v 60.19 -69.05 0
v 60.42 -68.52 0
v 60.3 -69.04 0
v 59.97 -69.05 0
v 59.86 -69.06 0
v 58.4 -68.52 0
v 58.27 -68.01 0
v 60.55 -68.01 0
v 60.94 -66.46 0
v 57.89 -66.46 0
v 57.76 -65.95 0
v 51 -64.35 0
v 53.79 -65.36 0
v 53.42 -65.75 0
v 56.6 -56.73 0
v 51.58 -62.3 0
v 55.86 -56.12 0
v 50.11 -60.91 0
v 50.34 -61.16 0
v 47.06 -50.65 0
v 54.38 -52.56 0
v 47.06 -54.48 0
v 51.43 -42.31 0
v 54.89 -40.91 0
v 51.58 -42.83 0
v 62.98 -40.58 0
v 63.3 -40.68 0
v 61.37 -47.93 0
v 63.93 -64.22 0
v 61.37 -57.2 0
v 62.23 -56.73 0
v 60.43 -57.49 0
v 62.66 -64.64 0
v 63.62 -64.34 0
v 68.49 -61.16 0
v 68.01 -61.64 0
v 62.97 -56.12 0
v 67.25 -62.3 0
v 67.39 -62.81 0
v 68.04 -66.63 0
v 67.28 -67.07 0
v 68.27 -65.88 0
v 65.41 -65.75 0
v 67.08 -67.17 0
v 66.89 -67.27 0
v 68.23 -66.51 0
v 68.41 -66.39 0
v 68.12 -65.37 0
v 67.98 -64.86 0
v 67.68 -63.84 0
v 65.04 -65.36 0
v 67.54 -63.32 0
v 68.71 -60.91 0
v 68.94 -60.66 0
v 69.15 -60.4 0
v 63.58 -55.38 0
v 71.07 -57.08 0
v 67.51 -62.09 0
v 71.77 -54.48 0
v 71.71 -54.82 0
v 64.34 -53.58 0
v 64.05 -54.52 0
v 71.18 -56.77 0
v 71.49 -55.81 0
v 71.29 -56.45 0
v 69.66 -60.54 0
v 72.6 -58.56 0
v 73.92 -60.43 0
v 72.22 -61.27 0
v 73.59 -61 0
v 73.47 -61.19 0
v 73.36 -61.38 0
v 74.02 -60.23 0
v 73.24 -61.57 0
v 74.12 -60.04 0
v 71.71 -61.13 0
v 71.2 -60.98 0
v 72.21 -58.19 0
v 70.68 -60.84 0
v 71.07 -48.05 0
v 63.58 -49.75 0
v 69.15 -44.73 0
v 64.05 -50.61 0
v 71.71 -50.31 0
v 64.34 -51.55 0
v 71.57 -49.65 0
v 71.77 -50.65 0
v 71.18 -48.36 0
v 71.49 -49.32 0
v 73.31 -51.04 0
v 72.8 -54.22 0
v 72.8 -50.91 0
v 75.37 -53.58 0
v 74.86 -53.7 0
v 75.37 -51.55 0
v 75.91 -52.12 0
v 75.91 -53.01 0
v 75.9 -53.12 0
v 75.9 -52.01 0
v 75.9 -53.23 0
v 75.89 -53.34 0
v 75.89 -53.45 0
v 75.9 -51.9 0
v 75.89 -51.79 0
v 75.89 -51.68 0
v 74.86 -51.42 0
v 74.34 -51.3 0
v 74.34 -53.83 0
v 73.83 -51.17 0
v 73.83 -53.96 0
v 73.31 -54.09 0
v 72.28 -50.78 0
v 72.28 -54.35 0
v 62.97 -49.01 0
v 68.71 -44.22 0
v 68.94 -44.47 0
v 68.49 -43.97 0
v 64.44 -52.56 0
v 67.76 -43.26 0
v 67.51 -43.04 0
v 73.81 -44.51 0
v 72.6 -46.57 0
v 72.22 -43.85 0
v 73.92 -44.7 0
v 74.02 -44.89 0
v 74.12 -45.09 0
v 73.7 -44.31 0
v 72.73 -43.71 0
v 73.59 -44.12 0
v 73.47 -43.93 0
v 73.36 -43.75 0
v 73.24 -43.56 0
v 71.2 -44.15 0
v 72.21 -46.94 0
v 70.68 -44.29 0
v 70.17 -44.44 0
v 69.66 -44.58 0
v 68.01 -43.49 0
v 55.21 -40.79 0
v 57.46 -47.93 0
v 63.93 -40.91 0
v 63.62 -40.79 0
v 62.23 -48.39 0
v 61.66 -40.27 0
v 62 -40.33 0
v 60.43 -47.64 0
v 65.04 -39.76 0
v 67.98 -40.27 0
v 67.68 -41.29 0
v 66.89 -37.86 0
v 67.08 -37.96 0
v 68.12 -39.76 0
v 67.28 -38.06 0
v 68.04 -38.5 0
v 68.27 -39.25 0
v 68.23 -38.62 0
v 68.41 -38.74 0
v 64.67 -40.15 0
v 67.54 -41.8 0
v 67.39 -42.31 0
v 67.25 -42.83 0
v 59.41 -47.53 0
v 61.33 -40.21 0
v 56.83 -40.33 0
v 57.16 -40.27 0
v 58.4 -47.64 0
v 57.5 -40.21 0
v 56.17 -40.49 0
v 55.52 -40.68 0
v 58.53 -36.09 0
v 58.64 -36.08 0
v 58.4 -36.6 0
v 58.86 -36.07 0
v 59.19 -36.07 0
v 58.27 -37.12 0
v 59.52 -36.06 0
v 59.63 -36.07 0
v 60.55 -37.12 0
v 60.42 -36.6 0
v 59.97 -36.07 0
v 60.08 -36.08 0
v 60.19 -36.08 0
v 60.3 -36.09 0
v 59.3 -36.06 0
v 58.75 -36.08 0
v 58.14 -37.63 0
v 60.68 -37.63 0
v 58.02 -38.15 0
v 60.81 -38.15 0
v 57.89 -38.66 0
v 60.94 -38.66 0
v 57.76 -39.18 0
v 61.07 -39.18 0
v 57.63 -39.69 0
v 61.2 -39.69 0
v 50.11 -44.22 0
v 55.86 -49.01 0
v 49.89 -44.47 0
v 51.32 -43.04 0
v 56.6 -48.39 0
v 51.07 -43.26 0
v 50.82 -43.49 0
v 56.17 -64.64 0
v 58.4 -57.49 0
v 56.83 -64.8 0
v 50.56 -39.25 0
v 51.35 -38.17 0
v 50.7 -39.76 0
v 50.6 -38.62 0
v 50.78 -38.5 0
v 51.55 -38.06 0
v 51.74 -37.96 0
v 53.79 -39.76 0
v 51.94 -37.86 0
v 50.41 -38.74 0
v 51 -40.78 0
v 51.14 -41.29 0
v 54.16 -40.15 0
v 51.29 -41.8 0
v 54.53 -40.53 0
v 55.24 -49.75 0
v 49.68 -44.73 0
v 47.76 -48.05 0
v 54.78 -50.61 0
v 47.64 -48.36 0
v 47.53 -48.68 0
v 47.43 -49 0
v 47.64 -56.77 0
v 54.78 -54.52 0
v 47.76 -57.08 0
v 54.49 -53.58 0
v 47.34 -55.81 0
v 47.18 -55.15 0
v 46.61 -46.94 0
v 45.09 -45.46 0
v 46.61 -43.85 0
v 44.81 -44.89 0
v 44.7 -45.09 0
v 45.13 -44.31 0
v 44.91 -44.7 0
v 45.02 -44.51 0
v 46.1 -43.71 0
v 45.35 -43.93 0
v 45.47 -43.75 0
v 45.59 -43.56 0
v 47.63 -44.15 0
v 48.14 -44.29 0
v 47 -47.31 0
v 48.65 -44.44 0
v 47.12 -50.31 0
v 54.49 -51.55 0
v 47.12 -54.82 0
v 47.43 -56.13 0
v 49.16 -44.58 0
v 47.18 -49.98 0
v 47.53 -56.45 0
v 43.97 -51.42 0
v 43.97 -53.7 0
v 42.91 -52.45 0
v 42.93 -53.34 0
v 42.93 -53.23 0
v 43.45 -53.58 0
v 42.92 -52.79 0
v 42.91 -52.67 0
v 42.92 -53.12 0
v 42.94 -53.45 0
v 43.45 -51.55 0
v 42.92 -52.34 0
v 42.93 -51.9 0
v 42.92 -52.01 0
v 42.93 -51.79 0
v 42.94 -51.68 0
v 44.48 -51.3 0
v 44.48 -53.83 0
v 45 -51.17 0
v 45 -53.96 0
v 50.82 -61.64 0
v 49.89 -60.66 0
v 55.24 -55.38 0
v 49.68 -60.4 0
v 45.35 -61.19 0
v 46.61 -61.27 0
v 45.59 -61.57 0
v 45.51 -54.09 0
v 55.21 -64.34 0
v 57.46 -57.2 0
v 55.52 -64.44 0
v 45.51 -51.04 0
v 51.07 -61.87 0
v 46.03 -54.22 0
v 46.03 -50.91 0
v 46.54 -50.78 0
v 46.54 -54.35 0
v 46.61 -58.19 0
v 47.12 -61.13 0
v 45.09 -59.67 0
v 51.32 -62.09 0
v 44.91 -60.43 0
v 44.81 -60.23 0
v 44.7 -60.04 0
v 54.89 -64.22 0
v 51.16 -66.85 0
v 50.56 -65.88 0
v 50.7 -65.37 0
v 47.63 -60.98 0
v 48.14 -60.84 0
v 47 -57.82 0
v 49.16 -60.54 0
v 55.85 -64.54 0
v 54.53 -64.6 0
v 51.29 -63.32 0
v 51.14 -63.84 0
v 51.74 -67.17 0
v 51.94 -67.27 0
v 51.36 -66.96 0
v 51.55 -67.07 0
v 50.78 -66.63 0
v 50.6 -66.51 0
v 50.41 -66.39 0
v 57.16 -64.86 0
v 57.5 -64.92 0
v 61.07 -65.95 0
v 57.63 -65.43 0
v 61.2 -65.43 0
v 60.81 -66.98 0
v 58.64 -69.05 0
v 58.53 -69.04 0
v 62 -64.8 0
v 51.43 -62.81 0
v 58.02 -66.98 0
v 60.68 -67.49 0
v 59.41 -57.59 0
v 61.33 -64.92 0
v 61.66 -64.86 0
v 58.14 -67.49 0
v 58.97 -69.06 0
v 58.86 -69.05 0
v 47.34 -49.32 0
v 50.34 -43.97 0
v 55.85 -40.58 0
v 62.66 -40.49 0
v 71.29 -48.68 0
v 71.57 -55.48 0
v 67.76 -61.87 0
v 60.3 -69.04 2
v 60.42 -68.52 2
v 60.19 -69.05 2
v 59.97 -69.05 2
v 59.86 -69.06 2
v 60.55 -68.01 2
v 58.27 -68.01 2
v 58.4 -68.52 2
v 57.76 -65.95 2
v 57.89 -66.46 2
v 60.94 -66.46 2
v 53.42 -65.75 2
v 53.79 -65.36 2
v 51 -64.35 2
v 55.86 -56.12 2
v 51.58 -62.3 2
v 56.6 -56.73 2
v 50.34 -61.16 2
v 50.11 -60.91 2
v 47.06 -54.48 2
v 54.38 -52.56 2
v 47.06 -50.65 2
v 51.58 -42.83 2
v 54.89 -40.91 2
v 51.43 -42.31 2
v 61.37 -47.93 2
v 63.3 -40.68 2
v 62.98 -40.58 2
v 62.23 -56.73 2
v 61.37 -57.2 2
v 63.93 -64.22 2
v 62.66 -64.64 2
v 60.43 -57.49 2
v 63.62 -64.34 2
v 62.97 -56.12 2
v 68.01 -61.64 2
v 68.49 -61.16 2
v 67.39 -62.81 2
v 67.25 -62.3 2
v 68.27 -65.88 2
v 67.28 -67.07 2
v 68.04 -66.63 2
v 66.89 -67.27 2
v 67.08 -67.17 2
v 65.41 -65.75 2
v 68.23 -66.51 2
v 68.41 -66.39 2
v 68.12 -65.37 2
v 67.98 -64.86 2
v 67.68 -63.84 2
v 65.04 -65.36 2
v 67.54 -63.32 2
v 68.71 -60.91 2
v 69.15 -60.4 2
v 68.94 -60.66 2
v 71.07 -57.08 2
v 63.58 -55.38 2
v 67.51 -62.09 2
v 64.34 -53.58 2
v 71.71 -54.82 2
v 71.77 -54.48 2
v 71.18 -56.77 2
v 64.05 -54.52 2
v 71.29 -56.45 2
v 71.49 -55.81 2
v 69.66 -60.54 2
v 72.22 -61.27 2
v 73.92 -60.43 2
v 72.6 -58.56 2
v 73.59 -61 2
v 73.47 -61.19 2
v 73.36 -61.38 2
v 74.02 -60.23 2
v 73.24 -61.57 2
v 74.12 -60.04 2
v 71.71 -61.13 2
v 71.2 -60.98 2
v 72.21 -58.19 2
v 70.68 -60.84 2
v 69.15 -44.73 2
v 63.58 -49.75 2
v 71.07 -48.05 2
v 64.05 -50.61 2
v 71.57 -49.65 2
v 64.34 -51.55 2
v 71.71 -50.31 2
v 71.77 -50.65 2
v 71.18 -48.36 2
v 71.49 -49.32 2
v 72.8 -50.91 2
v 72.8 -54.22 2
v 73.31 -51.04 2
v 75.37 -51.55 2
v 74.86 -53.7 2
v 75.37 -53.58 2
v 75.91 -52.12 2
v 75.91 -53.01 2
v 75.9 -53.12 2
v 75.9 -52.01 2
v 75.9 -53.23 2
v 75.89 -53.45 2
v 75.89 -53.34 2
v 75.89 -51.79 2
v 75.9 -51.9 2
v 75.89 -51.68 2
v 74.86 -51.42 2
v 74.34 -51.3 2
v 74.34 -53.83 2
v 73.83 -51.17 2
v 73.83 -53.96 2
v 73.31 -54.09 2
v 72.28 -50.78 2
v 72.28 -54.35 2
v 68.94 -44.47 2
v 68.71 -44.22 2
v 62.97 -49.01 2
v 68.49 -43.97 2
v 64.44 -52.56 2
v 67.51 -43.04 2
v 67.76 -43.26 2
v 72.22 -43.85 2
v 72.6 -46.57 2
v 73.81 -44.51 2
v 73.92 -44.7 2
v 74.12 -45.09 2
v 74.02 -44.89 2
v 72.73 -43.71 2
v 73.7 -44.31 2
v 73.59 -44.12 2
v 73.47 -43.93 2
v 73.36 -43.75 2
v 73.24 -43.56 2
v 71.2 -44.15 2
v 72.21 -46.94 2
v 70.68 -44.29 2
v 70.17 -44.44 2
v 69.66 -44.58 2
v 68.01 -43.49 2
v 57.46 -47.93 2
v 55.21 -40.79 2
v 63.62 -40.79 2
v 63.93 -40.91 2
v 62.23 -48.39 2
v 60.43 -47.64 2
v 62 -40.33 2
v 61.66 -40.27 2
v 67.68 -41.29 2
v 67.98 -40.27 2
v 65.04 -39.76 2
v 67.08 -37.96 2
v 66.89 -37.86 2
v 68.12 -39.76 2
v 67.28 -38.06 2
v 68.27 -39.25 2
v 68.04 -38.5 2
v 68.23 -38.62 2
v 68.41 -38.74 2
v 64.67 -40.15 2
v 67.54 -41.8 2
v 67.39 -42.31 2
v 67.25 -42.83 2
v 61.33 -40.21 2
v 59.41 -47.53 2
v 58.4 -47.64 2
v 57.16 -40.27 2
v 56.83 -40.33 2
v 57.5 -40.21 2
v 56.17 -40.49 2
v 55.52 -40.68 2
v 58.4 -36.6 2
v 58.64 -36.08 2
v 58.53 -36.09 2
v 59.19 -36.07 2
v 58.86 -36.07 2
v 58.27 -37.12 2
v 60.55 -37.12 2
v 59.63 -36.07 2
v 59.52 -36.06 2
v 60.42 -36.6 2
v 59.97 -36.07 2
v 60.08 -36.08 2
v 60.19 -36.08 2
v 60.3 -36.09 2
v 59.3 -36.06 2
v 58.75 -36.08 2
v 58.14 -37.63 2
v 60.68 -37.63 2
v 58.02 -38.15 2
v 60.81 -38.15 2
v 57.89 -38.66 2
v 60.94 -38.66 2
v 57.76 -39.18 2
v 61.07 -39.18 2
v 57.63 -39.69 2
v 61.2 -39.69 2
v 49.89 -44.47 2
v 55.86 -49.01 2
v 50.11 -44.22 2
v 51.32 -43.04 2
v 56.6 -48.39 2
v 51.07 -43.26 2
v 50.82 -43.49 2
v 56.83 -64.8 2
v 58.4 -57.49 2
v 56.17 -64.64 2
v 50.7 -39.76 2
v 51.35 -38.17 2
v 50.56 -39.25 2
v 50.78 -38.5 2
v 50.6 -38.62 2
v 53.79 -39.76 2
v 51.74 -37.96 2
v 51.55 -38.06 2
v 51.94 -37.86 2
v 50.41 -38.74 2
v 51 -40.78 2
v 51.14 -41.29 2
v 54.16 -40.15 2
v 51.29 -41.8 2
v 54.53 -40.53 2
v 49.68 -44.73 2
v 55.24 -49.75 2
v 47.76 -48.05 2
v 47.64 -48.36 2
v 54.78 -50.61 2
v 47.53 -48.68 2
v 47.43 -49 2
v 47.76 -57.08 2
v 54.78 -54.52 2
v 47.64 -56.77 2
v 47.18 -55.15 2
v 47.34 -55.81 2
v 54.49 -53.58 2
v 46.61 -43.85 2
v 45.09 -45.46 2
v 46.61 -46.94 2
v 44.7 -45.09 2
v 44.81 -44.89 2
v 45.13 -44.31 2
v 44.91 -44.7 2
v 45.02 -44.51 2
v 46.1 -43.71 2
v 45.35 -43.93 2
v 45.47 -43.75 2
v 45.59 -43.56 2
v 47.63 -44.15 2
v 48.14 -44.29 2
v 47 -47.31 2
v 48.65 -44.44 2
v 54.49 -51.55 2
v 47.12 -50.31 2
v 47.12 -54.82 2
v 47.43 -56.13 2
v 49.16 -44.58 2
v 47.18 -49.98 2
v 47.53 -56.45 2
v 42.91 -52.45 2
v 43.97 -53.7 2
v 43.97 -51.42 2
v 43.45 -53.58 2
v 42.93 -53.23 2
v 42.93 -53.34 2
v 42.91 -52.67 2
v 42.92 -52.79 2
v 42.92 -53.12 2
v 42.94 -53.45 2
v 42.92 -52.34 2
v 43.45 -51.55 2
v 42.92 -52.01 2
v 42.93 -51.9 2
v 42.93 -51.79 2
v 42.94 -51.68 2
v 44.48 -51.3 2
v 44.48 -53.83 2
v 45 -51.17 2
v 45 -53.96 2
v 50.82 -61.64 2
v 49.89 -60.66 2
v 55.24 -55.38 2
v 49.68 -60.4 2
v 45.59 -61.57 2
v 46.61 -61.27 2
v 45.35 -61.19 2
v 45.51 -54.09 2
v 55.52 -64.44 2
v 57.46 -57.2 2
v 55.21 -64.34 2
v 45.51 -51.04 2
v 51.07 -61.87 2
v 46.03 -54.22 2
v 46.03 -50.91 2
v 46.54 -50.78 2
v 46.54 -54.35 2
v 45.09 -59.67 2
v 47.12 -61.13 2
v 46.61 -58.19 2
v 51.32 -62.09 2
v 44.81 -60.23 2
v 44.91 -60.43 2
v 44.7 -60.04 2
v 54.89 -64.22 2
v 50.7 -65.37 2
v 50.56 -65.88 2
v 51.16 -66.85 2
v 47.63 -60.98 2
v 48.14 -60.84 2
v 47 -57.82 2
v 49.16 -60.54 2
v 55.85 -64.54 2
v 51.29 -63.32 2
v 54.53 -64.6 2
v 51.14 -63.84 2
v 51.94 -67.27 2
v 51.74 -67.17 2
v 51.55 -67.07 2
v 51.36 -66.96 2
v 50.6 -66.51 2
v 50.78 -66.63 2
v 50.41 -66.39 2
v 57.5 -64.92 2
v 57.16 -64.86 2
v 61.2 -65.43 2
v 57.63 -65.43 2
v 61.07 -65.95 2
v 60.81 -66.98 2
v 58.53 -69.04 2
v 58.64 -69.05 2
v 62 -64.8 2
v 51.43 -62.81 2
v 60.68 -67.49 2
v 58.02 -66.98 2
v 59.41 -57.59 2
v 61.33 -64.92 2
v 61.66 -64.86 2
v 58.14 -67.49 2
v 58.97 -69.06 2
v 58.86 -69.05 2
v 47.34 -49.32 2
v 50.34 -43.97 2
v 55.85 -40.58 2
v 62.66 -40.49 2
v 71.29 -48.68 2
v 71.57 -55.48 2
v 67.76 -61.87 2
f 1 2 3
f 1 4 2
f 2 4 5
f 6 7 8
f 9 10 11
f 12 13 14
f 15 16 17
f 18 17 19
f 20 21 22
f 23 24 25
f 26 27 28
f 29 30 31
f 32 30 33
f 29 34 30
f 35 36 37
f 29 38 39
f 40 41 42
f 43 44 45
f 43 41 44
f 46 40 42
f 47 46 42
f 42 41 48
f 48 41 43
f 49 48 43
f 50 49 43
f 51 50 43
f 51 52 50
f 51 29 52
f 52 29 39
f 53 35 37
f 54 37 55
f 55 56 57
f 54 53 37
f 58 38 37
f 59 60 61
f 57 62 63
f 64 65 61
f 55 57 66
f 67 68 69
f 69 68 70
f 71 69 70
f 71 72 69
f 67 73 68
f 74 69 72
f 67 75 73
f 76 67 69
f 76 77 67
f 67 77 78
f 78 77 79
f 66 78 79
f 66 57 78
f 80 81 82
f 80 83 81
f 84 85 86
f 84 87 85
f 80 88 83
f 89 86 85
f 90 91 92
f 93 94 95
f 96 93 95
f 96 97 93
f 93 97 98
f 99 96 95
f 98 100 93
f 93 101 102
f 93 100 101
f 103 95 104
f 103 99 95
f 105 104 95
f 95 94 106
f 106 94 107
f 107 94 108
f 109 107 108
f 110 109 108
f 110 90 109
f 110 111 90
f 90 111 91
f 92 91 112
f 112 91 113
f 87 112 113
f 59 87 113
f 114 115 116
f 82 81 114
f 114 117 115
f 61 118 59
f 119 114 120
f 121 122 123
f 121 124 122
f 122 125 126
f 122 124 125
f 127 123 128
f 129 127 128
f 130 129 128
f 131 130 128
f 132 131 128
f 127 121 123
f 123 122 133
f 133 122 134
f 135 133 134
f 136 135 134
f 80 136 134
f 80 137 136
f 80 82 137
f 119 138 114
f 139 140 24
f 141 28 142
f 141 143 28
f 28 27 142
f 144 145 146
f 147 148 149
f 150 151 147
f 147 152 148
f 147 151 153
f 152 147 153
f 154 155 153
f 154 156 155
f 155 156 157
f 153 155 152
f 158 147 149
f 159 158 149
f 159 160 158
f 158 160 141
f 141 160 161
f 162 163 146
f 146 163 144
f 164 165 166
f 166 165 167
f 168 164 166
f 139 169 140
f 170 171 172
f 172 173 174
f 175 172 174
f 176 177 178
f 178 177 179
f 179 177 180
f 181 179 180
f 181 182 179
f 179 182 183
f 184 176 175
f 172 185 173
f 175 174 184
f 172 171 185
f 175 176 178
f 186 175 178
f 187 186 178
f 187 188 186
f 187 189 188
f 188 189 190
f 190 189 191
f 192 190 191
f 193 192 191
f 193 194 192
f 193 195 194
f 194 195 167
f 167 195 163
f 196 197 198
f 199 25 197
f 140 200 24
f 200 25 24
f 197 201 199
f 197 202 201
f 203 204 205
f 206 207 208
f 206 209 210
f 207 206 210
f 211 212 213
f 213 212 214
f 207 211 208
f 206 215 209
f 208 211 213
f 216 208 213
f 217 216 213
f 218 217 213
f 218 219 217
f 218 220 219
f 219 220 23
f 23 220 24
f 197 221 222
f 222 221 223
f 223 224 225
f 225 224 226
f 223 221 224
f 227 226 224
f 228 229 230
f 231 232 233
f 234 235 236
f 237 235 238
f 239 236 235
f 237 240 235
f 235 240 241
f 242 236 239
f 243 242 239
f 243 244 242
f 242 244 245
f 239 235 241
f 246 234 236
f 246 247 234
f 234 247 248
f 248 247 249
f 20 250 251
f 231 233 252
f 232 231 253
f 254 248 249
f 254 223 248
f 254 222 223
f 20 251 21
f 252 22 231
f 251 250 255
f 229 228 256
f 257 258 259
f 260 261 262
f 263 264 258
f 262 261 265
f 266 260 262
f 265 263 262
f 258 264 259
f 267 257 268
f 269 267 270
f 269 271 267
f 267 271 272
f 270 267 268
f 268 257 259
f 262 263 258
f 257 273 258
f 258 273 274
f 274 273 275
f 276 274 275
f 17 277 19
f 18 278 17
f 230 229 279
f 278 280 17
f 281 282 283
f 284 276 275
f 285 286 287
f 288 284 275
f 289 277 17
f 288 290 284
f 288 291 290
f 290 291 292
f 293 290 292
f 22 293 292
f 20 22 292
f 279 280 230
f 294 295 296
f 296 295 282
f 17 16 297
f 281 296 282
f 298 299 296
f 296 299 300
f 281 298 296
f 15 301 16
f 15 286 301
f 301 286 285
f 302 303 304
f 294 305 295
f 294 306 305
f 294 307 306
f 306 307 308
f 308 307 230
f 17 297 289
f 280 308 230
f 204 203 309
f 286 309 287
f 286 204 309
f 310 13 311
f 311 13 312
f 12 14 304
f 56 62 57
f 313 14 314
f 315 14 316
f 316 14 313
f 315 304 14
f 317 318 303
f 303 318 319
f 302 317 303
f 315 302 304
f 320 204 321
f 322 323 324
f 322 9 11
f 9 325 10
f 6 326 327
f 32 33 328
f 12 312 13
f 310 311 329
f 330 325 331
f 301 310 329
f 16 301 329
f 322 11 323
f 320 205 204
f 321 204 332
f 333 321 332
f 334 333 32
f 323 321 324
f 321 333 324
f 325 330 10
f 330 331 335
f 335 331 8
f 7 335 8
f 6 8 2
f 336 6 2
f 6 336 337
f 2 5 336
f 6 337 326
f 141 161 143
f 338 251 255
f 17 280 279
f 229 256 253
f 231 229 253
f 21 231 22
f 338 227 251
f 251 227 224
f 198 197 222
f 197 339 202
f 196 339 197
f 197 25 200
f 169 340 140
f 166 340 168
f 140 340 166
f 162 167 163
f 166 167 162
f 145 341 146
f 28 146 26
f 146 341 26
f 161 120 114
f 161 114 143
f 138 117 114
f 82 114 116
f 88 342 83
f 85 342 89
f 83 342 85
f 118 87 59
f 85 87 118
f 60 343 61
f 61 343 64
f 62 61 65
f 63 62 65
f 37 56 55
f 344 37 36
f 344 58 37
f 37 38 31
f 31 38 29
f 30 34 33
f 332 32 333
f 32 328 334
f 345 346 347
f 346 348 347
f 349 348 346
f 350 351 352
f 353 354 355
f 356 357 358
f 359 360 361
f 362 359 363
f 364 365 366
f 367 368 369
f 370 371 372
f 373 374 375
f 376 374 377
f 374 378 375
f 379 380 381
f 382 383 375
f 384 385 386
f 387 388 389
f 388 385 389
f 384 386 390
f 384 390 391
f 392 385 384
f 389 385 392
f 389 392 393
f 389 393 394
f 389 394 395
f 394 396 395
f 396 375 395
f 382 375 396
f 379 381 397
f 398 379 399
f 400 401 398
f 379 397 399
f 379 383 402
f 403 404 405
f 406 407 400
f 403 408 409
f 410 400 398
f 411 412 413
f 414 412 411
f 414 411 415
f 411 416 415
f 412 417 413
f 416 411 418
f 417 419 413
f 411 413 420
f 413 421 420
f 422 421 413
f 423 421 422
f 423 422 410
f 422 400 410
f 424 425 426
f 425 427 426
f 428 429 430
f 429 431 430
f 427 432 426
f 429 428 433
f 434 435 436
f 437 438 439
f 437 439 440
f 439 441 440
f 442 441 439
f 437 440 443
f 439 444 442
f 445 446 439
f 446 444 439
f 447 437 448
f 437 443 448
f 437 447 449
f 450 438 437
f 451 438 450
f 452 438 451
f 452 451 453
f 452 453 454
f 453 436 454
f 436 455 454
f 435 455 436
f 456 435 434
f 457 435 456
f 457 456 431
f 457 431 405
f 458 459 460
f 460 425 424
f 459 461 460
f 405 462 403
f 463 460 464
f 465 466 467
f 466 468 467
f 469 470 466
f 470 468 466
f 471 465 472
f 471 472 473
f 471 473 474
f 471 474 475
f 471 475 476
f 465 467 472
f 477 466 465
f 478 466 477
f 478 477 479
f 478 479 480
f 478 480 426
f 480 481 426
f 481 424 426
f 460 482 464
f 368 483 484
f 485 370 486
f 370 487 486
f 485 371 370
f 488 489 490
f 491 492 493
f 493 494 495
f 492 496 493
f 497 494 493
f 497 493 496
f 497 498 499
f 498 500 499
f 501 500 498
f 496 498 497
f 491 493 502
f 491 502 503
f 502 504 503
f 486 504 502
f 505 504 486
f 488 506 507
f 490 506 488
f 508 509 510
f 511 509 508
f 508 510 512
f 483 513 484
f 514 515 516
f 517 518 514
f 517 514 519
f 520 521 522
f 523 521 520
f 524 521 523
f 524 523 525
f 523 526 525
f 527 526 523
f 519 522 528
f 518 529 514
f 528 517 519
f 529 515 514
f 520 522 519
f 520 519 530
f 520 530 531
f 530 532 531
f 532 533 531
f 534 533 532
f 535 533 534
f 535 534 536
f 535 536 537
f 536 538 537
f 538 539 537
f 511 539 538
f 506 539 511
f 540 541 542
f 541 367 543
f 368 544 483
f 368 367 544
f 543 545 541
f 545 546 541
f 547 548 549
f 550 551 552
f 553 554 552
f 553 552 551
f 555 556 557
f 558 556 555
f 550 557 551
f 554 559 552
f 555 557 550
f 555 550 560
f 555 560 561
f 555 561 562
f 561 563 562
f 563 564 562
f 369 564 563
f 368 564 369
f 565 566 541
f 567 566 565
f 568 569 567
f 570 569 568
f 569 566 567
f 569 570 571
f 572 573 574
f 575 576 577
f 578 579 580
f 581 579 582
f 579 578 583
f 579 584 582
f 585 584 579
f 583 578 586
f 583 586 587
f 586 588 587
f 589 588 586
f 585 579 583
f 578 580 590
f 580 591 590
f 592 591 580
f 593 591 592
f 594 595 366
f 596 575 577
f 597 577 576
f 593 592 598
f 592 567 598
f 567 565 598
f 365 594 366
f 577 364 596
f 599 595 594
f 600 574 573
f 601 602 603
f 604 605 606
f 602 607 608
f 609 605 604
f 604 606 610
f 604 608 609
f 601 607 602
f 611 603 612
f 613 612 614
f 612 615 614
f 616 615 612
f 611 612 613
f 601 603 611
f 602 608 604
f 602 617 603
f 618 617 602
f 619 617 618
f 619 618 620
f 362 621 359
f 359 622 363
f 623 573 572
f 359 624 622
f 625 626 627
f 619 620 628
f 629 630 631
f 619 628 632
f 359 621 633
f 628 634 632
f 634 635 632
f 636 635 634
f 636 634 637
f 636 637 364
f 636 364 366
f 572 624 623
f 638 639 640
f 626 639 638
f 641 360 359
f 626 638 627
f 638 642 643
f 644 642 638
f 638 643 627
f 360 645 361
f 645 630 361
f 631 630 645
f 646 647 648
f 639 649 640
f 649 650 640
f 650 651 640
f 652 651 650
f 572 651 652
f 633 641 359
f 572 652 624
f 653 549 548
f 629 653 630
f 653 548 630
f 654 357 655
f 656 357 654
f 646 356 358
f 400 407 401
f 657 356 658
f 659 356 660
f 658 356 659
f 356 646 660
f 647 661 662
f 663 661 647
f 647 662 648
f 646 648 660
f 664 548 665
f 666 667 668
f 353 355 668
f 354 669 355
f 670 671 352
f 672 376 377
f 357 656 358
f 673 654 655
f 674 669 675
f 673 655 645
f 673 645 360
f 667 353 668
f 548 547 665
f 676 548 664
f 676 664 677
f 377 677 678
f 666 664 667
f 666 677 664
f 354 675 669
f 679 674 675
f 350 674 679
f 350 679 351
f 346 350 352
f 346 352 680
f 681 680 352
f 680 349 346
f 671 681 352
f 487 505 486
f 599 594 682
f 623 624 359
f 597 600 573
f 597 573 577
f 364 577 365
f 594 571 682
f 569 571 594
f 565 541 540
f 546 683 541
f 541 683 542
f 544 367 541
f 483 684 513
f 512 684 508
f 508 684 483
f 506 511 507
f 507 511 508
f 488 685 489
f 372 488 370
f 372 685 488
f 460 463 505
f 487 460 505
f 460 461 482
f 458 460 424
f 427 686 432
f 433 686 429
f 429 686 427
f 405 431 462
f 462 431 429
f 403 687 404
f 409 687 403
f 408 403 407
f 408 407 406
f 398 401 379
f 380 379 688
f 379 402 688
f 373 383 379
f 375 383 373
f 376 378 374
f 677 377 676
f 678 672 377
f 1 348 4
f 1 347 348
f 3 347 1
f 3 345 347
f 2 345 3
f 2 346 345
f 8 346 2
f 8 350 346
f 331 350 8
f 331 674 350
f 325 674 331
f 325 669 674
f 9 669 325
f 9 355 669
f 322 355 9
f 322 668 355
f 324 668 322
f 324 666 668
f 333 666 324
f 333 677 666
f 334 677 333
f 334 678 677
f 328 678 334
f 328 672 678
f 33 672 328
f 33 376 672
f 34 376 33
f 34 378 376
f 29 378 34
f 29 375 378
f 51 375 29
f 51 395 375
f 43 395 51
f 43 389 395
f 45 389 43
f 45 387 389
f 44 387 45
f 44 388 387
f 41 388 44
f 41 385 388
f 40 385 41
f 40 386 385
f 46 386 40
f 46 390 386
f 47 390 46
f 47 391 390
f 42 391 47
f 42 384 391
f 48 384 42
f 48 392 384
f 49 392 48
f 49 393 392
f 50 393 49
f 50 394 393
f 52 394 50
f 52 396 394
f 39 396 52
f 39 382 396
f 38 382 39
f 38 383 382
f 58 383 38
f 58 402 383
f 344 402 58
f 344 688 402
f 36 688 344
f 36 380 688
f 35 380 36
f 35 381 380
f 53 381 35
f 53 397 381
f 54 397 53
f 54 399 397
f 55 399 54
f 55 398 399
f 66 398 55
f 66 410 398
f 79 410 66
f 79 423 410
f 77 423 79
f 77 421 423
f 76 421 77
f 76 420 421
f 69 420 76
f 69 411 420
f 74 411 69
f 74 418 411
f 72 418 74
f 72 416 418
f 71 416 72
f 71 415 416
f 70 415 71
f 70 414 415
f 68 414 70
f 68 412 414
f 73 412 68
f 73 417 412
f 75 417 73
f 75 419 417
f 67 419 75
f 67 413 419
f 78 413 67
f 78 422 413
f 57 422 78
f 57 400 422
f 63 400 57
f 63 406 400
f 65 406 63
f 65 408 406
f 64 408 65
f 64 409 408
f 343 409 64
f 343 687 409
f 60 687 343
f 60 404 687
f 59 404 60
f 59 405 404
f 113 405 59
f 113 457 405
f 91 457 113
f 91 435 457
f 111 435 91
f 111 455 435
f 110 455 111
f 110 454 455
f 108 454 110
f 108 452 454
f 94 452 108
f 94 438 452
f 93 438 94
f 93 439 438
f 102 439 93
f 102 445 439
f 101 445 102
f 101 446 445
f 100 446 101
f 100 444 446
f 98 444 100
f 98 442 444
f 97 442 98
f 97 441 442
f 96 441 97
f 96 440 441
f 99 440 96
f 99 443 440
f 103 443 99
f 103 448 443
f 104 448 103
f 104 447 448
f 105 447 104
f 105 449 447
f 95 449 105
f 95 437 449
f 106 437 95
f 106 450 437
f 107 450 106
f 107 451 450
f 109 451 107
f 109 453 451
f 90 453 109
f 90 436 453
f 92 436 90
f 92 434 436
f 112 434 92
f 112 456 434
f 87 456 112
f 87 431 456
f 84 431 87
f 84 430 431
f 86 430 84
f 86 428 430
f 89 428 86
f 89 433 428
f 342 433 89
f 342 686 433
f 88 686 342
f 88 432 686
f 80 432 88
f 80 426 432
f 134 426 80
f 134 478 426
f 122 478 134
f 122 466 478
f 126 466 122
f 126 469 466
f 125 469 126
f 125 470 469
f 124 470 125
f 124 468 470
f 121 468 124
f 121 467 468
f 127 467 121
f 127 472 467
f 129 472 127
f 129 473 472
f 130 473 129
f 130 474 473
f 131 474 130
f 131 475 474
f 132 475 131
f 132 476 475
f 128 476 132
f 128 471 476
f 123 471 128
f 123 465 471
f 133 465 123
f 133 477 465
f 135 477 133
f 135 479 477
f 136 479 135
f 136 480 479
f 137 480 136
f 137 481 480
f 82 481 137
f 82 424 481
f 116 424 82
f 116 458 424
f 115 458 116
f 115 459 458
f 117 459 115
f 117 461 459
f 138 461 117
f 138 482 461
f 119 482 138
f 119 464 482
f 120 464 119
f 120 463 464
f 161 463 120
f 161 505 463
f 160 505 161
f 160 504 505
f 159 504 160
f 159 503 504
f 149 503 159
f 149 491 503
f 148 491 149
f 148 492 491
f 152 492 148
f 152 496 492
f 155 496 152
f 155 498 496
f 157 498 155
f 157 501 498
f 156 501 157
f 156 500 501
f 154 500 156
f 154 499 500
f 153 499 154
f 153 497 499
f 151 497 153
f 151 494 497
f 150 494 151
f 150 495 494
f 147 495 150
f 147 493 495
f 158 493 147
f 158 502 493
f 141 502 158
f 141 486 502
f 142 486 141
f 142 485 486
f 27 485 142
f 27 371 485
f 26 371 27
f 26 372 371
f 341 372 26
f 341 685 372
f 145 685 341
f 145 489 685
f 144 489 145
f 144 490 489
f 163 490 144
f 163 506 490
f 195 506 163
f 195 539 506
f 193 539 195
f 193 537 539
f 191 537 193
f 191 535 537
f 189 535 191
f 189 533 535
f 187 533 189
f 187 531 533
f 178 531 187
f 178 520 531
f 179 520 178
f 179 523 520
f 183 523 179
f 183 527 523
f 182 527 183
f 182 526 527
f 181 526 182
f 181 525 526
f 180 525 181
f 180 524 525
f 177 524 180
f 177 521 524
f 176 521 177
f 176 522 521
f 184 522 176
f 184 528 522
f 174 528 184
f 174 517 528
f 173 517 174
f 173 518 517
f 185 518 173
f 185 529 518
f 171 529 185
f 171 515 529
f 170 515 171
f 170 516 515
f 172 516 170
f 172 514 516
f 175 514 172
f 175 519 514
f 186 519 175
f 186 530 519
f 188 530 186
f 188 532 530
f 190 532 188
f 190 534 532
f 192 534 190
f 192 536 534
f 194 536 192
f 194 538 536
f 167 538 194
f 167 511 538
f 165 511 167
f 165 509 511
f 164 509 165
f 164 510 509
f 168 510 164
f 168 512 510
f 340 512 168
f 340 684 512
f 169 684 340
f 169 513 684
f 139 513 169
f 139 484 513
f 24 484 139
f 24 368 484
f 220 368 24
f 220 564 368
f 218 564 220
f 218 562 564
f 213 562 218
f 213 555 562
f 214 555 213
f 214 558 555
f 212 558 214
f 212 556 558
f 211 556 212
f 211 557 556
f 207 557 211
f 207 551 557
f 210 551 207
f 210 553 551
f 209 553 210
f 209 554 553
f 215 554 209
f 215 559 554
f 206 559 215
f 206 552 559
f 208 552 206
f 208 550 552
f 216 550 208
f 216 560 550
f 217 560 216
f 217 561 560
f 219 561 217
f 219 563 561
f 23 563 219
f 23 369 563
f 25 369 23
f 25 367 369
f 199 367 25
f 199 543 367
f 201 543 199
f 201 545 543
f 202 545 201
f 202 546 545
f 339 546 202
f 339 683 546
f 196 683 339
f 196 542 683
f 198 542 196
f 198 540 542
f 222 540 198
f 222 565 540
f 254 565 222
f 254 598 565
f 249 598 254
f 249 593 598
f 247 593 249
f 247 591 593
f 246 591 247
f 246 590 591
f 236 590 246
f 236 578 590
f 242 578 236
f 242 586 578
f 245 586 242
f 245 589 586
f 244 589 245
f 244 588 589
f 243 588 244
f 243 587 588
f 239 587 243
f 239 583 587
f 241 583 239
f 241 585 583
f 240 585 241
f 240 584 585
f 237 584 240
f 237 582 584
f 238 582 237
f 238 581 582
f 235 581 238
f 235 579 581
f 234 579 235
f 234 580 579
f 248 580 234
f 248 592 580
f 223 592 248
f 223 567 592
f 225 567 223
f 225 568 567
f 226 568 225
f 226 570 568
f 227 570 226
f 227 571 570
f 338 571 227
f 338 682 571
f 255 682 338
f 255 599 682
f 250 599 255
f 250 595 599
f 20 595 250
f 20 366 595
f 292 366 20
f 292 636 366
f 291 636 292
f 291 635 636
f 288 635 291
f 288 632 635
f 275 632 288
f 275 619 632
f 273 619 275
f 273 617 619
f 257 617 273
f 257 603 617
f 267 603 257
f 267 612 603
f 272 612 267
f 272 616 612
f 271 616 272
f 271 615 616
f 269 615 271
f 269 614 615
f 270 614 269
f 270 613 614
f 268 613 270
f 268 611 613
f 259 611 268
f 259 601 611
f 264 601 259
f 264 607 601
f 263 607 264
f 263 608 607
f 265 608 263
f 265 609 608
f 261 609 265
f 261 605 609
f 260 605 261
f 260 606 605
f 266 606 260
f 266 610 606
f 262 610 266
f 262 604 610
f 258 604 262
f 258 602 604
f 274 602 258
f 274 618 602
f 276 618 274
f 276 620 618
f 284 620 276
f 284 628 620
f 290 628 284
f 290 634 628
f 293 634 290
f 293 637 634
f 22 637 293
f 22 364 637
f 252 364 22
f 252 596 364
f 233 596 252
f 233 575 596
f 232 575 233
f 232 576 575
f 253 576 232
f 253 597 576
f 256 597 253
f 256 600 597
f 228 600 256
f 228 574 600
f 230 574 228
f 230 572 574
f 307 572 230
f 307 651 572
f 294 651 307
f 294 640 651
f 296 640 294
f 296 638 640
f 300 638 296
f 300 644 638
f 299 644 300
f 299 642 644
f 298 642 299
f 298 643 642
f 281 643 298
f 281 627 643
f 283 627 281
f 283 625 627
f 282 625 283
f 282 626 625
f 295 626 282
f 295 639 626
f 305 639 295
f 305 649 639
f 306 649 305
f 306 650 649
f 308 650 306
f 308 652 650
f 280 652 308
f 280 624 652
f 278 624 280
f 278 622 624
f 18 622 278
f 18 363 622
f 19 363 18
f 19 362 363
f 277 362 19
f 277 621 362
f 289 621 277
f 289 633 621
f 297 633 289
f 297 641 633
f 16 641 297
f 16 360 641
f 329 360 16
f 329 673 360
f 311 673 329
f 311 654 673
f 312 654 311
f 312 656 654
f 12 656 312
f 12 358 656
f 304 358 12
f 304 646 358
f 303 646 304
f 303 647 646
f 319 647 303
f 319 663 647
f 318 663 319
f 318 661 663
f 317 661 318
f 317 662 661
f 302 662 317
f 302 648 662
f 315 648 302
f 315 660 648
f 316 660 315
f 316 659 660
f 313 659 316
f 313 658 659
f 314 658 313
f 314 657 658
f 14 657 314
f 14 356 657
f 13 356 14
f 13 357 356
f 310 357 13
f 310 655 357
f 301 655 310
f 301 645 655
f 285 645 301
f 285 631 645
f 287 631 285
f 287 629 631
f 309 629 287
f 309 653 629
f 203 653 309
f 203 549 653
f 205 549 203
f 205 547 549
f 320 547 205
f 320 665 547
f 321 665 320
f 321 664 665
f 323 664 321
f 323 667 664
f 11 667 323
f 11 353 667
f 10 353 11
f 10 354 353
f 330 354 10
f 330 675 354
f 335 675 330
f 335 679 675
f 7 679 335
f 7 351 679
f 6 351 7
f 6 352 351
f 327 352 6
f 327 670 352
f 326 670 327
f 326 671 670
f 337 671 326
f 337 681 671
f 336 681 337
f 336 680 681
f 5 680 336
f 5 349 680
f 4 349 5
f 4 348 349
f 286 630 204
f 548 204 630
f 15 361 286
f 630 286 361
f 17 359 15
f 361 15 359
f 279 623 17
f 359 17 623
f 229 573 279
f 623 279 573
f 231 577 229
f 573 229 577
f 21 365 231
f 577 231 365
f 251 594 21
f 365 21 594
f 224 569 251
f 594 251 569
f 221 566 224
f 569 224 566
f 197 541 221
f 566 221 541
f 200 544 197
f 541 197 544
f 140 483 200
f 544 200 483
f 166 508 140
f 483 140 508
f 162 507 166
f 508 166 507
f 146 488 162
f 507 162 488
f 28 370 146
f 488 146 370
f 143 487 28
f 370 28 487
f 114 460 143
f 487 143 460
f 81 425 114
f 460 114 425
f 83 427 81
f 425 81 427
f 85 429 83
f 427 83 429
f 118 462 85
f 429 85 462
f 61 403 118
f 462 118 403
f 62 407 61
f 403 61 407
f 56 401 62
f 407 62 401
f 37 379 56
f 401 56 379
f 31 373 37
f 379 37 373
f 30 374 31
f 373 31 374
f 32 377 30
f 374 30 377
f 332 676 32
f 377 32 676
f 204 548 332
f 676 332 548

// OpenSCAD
linear_extrude(height = 2, center = false) {

polygon(points=[[59.41,-57.59],[58.4,-57.49],[57.46,-57.2],[56.6,-56.73],[55.86,-56.12],[55.24,-55.38],[54.78,-54.52],[54.49,-53.58],[54.38,-52.56],[54.49,-51.55],[54.78,-50.61],[55.24,-49.75],[55.86,-49.01],[56.6,-48.39],[57.46,-47.93],[58.4,-47.64],[59.41,-47.53],[60.43,-47.64],[61.37,-47.93],[62.23,-48.39],[62.97,-49.01],[63.58,-49.75],[64.05,-50.61],[64.34,-51.55],[64.44,-52.56],[64.34,-53.58],[64.05,-54.52],[63.58,-55.38],[62.97,-56.12],[62.23,-56.73],[61.37,-57.2],[60.43,-57.49],[71.07,-48.05],[71.45,-47.68],[71.83,-47.31],[72.21,-46.94],[72.6,-46.57],[72.98,-46.2],[73.36,-45.83],[73.74,-45.46],[74.12,-45.09],[74.02,-44.89],[73.92,-44.7],[73.81,-44.51],[73.7,-44.31],[73.59,-44.12],[73.47,-43.93],[73.36,-43.75],[73.24,-43.56],[72.73,-43.71],[72.22,-43.85],[71.71,-44],[71.2,-44.15],[70.68,-44.29],[70.17,-44.44],[69.66,-44.58],[69.15,-44.73],[68.94,-44.47],[68.71,-44.22],[68.49,-43.97],[68.25,-43.73],[68.01,-43.49],[67.76,-43.26],[67.51,-43.04],[67.25,-42.83],[67.39,-42.31],[67.54,-41.8],[67.68,-41.29],[67.83,-40.78],[67.98,-40.27],[68.12,-39.76],[68.27,-39.25],[68.41,-38.74],[68.23,-38.62],[68.04,-38.5],[67.85,-38.39],[67.66,-38.28],[67.47,-38.17],[67.28,-38.06],[67.08,-37.96],[66.89,-37.86],[66.52,-38.24],[66.15,-38.62],[65.78,-39],[65.41,-39.38],[65.04,-39.76],[64.67,-40.15],[64.3,-40.53],[63.93,-40.91],[63.62,-40.79],[63.3,-40.68],[62.98,-40.58],[62.66,-40.49],[62.33,-40.41],[62,-40.33],[61.66,-40.27],[61.33,-40.21],[61.2,-39.69],[61.07,-39.18],[60.94,-38.66],[60.81,-38.15],[60.68,-37.63],[60.55,-37.12],[60.42,-36.6],[60.3,-36.09],[60.19,-36.08],[60.08,-36.08],[59.97,-36.07],[59.86,-36.07],[59.75,-36.07],[59.63,-36.07],[59.52,-36.06],[59.41,-36.06],[59.3,-36.06],[59.19,-36.07],[59.08,-36.07],[58.97,-36.07],[58.86,-36.07],[58.75,-36.08],[58.64,-36.08],[58.53,-36.09],[58.4,-36.6],[58.27,-37.12],[58.14,-37.63],[58.02,-38.15],[57.89,-38.66],[57.76,-39.18],[57.63,-39.69],[57.5,-40.21],[57.16,-40.27],[56.83,-40.33],[56.5,-40.41],[56.17,-40.49],[55.85,-40.58],[55.52,-40.68],[55.21,-40.79],[54.89,-40.91],[54.53,-40.53],[54.16,-40.15],[53.79,-39.76],[53.42,-39.38],[53.05,-39],[52.68,-38.62],[52.31,-38.24],[51.94,-37.86],[51.74,-37.96],[51.55,-38.06],[51.35,-38.17],[51.16,-38.28],[50.97,-38.39],[50.78,-38.5],[50.6,-38.62],[50.41,-38.74],[50.56,-39.25],[50.7,-39.76],[50.85,-40.27],[51,-40.78],[51.14,-41.29],[51.29,-41.8],[51.43,-42.31],[51.58,-42.83],[51.32,-43.04],[51.07,-43.26],[50.82,-43.49],[50.58,-43.73],[50.34,-43.97],[50.11,-44.22],[49.89,-44.47],[49.68,-44.73],[49.16,-44.58],[48.65,-44.44],[48.14,-44.29],[47.63,-44.15],[47.12,-44],[46.61,-43.85],[46.1,-43.71],[45.59,-43.56],[45.47,-43.75],[45.35,-43.93],[45.24,-44.12],[45.13,-44.31],[45.02,-44.51],[44.91,-44.7],[44.81,-44.89],[44.7,-45.09],[45.09,-45.46],[45.47,-45.83],[45.85,-46.2],[46.23,-46.57],[46.61,-46.94],[47,-47.31],[47.38,-47.68],[47.76,-48.05],[47.64,-48.36],[47.53,-48.68],[47.43,-49],[47.34,-49.32],[47.26,-49.65],[47.18,-49.98],[47.12,-50.31],[47.06,-50.65],[46.54,-50.78],[46.03,-50.91],[45.51,-51.04],[45,-51.17],[44.48,-51.3],[43.97,-51.42],[43.45,-51.55],[42.94,-51.68],[42.93,-51.79],[42.93,-51.9],[42.92,-52.01],[42.92,-52.12],[42.92,-52.23],[42.92,-52.34],[42.91,-52.45],[42.91,-52.56],[42.91,-52.67],[42.92,-52.79],[42.92,-52.9],[42.92,-53.01],[42.92,-53.12],[42.93,-53.23],[42.93,-53.34],[42.94,-53.45],[43.45,-53.58],[43.97,-53.7],[44.48,-53.83],[45,-53.96],[45.51,-54.09],[46.03,-54.22],[46.54,-54.35],[47.06,-54.48],[47.12,-54.82],[47.18,-55.15],[47.26,-55.48],[47.34,-55.81],[47.43,-56.13],[47.53,-56.45],[47.64,-56.77],[47.76,-57.08],[47.38,-57.45],[47,-57.82],[46.61,-58.19],[46.23,-58.56],[45.85,-58.93],[45.47,-59.3],[45.09,-59.67],[44.7,-60.04],[44.81,-60.23],[44.91,-60.43],[45.02,-60.62],[45.13,-60.81],[45.24,-61],[45.35,-61.19],[45.47,-61.38],[45.59,-61.57],[46.1,-61.42],[46.61,-61.27],[47.12,-61.13],[47.63,-60.98],[48.14,-60.84],[48.65,-60.69],[49.16,-60.54],[49.68,-60.4],[49.89,-60.66],[50.11,-60.91],[50.34,-61.16],[50.58,-61.4],[50.82,-61.64],[51.07,-61.87],[51.32,-62.09],[51.58,-62.3],[51.43,-62.81],[51.29,-63.32],[51.14,-63.84],[51,-64.35],[50.85,-64.86],[50.7,-65.37],[50.56,-65.88],[50.41,-66.39],[50.6,-66.51],[50.78,-66.63],[50.97,-66.74],[51.16,-66.85],[51.36,-66.96],[51.55,-67.07],[51.74,-67.17],[51.94,-67.27],[52.31,-66.89],[52.68,-66.51],[53.05,-66.13],[53.42,-65.75],[53.79,-65.36],[54.16,-64.98],[54.53,-64.6],[54.89,-64.22],[55.21,-64.34],[55.52,-64.44],[55.85,-64.54],[56.17,-64.64],[56.5,-64.72],[56.83,-64.8],[57.16,-64.86],[57.5,-64.92],[57.63,-65.43],[57.76,-65.95],[57.89,-66.46],[58.02,-66.98],[58.14,-67.49],[58.27,-68.01],[58.4,-68.52],[58.53,-69.04],[58.64,-69.05],[58.75,-69.05],[58.86,-69.05],[58.97,-69.06],[59.08,-69.06],[59.19,-69.06],[59.3,-69.06],[59.41,-69.06],[59.52,-69.06],[59.63,-69.06],[59.75,-69.06],[59.86,-69.06],[59.97,-69.05],[60.08,-69.05],[60.19,-69.05],[60.3,-69.04],[60.42,-68.52],[60.55,-68.01],[60.68,-67.49],[60.81,-66.98],[60.94,-66.46],[61.07,-65.95],[61.2,-65.43],[61.33,-64.92],[61.66,-64.86],[62,-64.8],[62.33,-64.72],[62.66,-64.64],[62.98,-64.54],[63.3,-64.44],[63.62,-64.34],[63.93,-64.22],[64.3,-64.6],[64.67,-64.98],[65.04,-65.36],[65.41,-65.75],[65.78,-66.13],[66.15,-66.51],[66.52,-66.89],[66.89,-67.27],[67.08,-67.17],[67.28,-67.07],[67.47,-66.96],[67.66,-66.85],[67.85,-66.74],[68.04,-66.63],[68.23,-66.51],[68.41,-66.39],[68.27,-65.88],[68.12,-65.37],[67.98,-64.86],[67.83,-64.35],[67.68,-63.84],[67.54,-63.32],[67.39,-62.81],[67.25,-62.3],[67.51,-62.09],[67.76,-61.87],[68.01,-61.64],[68.25,-61.4],[68.49,-61.16],[68.71,-60.91],[68.94,-60.66],[69.15,-60.4],[69.66,-60.54],[70.17,-60.69],[70.68,-60.84],[71.2,-60.98],[71.71,-61.13],[72.22,-61.27],[72.73,-61.42],[73.24,-61.57],[73.36,-61.38],[73.47,-61.19],[73.59,-61],[73.7,-60.81],[73.81,-60.62],[73.92,-60.43],[74.02,-60.23],[74.12,-60.04],[73.74,-59.67],[73.36,-59.3],[72.98,-58.93],[72.6,-58.56],[72.21,-58.19],[71.83,-57.82],[71.45,-57.45],[71.07,-57.08],[71.18,-56.77],[71.29,-56.45],[71.39,-56.13],[71.49,-55.81],[71.57,-55.48],[71.64,-55.15],[71.71,-54.82],[71.77,-54.48],[72.28,-54.35],[72.8,-54.22],[73.31,-54.09],[73.83,-53.96],[74.34,-53.83],[74.86,-53.7],[75.37,-53.58],[75.89,-53.45],[75.89,-53.34],[75.9,-53.23],[75.9,-53.12],[75.91,-53.01],[75.91,-52.9],[75.91,-52.79],[75.91,-52.67],[75.91,-52.56],[75.91,-52.45],[75.91,-52.34],[75.91,-52.23],[75.91,-52.12],[75.9,-52.01],[75.9,-51.9],[75.89,-51.79],[75.89,-51.68],[75.37,-51.55],[74.86,-51.42],[74.34,-51.3],[73.83,-51.17],[73.31,-51.04],[72.8,-50.91],[72.28,-50.78],[71.77,-50.65],[71.71,-50.31],[71.64,-49.98],[71.57,-49.65],[71.49,-49.32],[71.39,-49],[71.29,-48.68],[71.18,-48.36]], paths=[[0,1,2,3,4,5,6,7,8,9,10,11,12,13,14,15,16,17,18,19,20,21,22,23,24,25,26,27,28,29,30,31],[32,33,34,35,36,37,38,39,40,41,42,43,44,45,46,47,48,49,50,51,52,53,54,55,56,57,58,59,60,61,62,63,64,65,66,67,68,69,70,71,72,73,74,75,76,77,78,79,80,81,82,83,84,85,86,87,88,89,90,91,92,93,94,95,96,97,98,99,100,101,102,103,104,105,106,107,108,109,110,111,112,113,114,115,116,117,118,119,120,121,122,123,124,125,126,127,128,129,130,131,132,133,134,135,136,137,138,139,140,141,142,143,144,145,146,147,148,149,150,151,152,153,154,155,156,157,158,159,160,161,162,163,164,165,166,167,168,169,170,171,172,173,174,175,176,177,178,179,180,181,182,183,184,185,186,187,188,189,190,191,192,193,194,195,196,197,198,199,200,201,202,203,204,205,206,207,208,209,210,211,212,213,214,215,216,217,218,219,220,221,222,223,224,225,226,227,228,229,230,231,232,233,234,235,236,237,238,239,240,241,242,243,244,245,246,247,248,249,250,251,252,253,254,255,256,257,258,259,260,261,262,263,264,265,266,267,268,269,270,271,272,273,274,275,276,277,278,279,280,281,282,283,284,285,286,287,288,289,290,291,292,293,294,295,296,297,298,299,300,301,302,303,304,305,306,307,308,309,310,311,312,313,314,315,316,317,318,319,320,321,322,323,324,325,326,327,328,329,330,331,332,333,334,335,336,337,338,339,340,341,342,343,344,345,346,347,348,349,350,351,352,353,354,355,356,357,358,359,360,361,362,363,364,365,366,367,368,369,370,371,372,373,374,375,376,377,378,379,380,381,382,383,384,385,386,387,388,389,390,391,392,393,394,395,396,397,398,399,400,401,402,403,404,405,406,407,408,409,410,411,412,413,414,415,416,417,418,419,420,421,422,423,424,425,426,427,428,429,430,431,432,433,434,435,436,437,438,439,440,441,442,443,444,445,446,447]]);

}
